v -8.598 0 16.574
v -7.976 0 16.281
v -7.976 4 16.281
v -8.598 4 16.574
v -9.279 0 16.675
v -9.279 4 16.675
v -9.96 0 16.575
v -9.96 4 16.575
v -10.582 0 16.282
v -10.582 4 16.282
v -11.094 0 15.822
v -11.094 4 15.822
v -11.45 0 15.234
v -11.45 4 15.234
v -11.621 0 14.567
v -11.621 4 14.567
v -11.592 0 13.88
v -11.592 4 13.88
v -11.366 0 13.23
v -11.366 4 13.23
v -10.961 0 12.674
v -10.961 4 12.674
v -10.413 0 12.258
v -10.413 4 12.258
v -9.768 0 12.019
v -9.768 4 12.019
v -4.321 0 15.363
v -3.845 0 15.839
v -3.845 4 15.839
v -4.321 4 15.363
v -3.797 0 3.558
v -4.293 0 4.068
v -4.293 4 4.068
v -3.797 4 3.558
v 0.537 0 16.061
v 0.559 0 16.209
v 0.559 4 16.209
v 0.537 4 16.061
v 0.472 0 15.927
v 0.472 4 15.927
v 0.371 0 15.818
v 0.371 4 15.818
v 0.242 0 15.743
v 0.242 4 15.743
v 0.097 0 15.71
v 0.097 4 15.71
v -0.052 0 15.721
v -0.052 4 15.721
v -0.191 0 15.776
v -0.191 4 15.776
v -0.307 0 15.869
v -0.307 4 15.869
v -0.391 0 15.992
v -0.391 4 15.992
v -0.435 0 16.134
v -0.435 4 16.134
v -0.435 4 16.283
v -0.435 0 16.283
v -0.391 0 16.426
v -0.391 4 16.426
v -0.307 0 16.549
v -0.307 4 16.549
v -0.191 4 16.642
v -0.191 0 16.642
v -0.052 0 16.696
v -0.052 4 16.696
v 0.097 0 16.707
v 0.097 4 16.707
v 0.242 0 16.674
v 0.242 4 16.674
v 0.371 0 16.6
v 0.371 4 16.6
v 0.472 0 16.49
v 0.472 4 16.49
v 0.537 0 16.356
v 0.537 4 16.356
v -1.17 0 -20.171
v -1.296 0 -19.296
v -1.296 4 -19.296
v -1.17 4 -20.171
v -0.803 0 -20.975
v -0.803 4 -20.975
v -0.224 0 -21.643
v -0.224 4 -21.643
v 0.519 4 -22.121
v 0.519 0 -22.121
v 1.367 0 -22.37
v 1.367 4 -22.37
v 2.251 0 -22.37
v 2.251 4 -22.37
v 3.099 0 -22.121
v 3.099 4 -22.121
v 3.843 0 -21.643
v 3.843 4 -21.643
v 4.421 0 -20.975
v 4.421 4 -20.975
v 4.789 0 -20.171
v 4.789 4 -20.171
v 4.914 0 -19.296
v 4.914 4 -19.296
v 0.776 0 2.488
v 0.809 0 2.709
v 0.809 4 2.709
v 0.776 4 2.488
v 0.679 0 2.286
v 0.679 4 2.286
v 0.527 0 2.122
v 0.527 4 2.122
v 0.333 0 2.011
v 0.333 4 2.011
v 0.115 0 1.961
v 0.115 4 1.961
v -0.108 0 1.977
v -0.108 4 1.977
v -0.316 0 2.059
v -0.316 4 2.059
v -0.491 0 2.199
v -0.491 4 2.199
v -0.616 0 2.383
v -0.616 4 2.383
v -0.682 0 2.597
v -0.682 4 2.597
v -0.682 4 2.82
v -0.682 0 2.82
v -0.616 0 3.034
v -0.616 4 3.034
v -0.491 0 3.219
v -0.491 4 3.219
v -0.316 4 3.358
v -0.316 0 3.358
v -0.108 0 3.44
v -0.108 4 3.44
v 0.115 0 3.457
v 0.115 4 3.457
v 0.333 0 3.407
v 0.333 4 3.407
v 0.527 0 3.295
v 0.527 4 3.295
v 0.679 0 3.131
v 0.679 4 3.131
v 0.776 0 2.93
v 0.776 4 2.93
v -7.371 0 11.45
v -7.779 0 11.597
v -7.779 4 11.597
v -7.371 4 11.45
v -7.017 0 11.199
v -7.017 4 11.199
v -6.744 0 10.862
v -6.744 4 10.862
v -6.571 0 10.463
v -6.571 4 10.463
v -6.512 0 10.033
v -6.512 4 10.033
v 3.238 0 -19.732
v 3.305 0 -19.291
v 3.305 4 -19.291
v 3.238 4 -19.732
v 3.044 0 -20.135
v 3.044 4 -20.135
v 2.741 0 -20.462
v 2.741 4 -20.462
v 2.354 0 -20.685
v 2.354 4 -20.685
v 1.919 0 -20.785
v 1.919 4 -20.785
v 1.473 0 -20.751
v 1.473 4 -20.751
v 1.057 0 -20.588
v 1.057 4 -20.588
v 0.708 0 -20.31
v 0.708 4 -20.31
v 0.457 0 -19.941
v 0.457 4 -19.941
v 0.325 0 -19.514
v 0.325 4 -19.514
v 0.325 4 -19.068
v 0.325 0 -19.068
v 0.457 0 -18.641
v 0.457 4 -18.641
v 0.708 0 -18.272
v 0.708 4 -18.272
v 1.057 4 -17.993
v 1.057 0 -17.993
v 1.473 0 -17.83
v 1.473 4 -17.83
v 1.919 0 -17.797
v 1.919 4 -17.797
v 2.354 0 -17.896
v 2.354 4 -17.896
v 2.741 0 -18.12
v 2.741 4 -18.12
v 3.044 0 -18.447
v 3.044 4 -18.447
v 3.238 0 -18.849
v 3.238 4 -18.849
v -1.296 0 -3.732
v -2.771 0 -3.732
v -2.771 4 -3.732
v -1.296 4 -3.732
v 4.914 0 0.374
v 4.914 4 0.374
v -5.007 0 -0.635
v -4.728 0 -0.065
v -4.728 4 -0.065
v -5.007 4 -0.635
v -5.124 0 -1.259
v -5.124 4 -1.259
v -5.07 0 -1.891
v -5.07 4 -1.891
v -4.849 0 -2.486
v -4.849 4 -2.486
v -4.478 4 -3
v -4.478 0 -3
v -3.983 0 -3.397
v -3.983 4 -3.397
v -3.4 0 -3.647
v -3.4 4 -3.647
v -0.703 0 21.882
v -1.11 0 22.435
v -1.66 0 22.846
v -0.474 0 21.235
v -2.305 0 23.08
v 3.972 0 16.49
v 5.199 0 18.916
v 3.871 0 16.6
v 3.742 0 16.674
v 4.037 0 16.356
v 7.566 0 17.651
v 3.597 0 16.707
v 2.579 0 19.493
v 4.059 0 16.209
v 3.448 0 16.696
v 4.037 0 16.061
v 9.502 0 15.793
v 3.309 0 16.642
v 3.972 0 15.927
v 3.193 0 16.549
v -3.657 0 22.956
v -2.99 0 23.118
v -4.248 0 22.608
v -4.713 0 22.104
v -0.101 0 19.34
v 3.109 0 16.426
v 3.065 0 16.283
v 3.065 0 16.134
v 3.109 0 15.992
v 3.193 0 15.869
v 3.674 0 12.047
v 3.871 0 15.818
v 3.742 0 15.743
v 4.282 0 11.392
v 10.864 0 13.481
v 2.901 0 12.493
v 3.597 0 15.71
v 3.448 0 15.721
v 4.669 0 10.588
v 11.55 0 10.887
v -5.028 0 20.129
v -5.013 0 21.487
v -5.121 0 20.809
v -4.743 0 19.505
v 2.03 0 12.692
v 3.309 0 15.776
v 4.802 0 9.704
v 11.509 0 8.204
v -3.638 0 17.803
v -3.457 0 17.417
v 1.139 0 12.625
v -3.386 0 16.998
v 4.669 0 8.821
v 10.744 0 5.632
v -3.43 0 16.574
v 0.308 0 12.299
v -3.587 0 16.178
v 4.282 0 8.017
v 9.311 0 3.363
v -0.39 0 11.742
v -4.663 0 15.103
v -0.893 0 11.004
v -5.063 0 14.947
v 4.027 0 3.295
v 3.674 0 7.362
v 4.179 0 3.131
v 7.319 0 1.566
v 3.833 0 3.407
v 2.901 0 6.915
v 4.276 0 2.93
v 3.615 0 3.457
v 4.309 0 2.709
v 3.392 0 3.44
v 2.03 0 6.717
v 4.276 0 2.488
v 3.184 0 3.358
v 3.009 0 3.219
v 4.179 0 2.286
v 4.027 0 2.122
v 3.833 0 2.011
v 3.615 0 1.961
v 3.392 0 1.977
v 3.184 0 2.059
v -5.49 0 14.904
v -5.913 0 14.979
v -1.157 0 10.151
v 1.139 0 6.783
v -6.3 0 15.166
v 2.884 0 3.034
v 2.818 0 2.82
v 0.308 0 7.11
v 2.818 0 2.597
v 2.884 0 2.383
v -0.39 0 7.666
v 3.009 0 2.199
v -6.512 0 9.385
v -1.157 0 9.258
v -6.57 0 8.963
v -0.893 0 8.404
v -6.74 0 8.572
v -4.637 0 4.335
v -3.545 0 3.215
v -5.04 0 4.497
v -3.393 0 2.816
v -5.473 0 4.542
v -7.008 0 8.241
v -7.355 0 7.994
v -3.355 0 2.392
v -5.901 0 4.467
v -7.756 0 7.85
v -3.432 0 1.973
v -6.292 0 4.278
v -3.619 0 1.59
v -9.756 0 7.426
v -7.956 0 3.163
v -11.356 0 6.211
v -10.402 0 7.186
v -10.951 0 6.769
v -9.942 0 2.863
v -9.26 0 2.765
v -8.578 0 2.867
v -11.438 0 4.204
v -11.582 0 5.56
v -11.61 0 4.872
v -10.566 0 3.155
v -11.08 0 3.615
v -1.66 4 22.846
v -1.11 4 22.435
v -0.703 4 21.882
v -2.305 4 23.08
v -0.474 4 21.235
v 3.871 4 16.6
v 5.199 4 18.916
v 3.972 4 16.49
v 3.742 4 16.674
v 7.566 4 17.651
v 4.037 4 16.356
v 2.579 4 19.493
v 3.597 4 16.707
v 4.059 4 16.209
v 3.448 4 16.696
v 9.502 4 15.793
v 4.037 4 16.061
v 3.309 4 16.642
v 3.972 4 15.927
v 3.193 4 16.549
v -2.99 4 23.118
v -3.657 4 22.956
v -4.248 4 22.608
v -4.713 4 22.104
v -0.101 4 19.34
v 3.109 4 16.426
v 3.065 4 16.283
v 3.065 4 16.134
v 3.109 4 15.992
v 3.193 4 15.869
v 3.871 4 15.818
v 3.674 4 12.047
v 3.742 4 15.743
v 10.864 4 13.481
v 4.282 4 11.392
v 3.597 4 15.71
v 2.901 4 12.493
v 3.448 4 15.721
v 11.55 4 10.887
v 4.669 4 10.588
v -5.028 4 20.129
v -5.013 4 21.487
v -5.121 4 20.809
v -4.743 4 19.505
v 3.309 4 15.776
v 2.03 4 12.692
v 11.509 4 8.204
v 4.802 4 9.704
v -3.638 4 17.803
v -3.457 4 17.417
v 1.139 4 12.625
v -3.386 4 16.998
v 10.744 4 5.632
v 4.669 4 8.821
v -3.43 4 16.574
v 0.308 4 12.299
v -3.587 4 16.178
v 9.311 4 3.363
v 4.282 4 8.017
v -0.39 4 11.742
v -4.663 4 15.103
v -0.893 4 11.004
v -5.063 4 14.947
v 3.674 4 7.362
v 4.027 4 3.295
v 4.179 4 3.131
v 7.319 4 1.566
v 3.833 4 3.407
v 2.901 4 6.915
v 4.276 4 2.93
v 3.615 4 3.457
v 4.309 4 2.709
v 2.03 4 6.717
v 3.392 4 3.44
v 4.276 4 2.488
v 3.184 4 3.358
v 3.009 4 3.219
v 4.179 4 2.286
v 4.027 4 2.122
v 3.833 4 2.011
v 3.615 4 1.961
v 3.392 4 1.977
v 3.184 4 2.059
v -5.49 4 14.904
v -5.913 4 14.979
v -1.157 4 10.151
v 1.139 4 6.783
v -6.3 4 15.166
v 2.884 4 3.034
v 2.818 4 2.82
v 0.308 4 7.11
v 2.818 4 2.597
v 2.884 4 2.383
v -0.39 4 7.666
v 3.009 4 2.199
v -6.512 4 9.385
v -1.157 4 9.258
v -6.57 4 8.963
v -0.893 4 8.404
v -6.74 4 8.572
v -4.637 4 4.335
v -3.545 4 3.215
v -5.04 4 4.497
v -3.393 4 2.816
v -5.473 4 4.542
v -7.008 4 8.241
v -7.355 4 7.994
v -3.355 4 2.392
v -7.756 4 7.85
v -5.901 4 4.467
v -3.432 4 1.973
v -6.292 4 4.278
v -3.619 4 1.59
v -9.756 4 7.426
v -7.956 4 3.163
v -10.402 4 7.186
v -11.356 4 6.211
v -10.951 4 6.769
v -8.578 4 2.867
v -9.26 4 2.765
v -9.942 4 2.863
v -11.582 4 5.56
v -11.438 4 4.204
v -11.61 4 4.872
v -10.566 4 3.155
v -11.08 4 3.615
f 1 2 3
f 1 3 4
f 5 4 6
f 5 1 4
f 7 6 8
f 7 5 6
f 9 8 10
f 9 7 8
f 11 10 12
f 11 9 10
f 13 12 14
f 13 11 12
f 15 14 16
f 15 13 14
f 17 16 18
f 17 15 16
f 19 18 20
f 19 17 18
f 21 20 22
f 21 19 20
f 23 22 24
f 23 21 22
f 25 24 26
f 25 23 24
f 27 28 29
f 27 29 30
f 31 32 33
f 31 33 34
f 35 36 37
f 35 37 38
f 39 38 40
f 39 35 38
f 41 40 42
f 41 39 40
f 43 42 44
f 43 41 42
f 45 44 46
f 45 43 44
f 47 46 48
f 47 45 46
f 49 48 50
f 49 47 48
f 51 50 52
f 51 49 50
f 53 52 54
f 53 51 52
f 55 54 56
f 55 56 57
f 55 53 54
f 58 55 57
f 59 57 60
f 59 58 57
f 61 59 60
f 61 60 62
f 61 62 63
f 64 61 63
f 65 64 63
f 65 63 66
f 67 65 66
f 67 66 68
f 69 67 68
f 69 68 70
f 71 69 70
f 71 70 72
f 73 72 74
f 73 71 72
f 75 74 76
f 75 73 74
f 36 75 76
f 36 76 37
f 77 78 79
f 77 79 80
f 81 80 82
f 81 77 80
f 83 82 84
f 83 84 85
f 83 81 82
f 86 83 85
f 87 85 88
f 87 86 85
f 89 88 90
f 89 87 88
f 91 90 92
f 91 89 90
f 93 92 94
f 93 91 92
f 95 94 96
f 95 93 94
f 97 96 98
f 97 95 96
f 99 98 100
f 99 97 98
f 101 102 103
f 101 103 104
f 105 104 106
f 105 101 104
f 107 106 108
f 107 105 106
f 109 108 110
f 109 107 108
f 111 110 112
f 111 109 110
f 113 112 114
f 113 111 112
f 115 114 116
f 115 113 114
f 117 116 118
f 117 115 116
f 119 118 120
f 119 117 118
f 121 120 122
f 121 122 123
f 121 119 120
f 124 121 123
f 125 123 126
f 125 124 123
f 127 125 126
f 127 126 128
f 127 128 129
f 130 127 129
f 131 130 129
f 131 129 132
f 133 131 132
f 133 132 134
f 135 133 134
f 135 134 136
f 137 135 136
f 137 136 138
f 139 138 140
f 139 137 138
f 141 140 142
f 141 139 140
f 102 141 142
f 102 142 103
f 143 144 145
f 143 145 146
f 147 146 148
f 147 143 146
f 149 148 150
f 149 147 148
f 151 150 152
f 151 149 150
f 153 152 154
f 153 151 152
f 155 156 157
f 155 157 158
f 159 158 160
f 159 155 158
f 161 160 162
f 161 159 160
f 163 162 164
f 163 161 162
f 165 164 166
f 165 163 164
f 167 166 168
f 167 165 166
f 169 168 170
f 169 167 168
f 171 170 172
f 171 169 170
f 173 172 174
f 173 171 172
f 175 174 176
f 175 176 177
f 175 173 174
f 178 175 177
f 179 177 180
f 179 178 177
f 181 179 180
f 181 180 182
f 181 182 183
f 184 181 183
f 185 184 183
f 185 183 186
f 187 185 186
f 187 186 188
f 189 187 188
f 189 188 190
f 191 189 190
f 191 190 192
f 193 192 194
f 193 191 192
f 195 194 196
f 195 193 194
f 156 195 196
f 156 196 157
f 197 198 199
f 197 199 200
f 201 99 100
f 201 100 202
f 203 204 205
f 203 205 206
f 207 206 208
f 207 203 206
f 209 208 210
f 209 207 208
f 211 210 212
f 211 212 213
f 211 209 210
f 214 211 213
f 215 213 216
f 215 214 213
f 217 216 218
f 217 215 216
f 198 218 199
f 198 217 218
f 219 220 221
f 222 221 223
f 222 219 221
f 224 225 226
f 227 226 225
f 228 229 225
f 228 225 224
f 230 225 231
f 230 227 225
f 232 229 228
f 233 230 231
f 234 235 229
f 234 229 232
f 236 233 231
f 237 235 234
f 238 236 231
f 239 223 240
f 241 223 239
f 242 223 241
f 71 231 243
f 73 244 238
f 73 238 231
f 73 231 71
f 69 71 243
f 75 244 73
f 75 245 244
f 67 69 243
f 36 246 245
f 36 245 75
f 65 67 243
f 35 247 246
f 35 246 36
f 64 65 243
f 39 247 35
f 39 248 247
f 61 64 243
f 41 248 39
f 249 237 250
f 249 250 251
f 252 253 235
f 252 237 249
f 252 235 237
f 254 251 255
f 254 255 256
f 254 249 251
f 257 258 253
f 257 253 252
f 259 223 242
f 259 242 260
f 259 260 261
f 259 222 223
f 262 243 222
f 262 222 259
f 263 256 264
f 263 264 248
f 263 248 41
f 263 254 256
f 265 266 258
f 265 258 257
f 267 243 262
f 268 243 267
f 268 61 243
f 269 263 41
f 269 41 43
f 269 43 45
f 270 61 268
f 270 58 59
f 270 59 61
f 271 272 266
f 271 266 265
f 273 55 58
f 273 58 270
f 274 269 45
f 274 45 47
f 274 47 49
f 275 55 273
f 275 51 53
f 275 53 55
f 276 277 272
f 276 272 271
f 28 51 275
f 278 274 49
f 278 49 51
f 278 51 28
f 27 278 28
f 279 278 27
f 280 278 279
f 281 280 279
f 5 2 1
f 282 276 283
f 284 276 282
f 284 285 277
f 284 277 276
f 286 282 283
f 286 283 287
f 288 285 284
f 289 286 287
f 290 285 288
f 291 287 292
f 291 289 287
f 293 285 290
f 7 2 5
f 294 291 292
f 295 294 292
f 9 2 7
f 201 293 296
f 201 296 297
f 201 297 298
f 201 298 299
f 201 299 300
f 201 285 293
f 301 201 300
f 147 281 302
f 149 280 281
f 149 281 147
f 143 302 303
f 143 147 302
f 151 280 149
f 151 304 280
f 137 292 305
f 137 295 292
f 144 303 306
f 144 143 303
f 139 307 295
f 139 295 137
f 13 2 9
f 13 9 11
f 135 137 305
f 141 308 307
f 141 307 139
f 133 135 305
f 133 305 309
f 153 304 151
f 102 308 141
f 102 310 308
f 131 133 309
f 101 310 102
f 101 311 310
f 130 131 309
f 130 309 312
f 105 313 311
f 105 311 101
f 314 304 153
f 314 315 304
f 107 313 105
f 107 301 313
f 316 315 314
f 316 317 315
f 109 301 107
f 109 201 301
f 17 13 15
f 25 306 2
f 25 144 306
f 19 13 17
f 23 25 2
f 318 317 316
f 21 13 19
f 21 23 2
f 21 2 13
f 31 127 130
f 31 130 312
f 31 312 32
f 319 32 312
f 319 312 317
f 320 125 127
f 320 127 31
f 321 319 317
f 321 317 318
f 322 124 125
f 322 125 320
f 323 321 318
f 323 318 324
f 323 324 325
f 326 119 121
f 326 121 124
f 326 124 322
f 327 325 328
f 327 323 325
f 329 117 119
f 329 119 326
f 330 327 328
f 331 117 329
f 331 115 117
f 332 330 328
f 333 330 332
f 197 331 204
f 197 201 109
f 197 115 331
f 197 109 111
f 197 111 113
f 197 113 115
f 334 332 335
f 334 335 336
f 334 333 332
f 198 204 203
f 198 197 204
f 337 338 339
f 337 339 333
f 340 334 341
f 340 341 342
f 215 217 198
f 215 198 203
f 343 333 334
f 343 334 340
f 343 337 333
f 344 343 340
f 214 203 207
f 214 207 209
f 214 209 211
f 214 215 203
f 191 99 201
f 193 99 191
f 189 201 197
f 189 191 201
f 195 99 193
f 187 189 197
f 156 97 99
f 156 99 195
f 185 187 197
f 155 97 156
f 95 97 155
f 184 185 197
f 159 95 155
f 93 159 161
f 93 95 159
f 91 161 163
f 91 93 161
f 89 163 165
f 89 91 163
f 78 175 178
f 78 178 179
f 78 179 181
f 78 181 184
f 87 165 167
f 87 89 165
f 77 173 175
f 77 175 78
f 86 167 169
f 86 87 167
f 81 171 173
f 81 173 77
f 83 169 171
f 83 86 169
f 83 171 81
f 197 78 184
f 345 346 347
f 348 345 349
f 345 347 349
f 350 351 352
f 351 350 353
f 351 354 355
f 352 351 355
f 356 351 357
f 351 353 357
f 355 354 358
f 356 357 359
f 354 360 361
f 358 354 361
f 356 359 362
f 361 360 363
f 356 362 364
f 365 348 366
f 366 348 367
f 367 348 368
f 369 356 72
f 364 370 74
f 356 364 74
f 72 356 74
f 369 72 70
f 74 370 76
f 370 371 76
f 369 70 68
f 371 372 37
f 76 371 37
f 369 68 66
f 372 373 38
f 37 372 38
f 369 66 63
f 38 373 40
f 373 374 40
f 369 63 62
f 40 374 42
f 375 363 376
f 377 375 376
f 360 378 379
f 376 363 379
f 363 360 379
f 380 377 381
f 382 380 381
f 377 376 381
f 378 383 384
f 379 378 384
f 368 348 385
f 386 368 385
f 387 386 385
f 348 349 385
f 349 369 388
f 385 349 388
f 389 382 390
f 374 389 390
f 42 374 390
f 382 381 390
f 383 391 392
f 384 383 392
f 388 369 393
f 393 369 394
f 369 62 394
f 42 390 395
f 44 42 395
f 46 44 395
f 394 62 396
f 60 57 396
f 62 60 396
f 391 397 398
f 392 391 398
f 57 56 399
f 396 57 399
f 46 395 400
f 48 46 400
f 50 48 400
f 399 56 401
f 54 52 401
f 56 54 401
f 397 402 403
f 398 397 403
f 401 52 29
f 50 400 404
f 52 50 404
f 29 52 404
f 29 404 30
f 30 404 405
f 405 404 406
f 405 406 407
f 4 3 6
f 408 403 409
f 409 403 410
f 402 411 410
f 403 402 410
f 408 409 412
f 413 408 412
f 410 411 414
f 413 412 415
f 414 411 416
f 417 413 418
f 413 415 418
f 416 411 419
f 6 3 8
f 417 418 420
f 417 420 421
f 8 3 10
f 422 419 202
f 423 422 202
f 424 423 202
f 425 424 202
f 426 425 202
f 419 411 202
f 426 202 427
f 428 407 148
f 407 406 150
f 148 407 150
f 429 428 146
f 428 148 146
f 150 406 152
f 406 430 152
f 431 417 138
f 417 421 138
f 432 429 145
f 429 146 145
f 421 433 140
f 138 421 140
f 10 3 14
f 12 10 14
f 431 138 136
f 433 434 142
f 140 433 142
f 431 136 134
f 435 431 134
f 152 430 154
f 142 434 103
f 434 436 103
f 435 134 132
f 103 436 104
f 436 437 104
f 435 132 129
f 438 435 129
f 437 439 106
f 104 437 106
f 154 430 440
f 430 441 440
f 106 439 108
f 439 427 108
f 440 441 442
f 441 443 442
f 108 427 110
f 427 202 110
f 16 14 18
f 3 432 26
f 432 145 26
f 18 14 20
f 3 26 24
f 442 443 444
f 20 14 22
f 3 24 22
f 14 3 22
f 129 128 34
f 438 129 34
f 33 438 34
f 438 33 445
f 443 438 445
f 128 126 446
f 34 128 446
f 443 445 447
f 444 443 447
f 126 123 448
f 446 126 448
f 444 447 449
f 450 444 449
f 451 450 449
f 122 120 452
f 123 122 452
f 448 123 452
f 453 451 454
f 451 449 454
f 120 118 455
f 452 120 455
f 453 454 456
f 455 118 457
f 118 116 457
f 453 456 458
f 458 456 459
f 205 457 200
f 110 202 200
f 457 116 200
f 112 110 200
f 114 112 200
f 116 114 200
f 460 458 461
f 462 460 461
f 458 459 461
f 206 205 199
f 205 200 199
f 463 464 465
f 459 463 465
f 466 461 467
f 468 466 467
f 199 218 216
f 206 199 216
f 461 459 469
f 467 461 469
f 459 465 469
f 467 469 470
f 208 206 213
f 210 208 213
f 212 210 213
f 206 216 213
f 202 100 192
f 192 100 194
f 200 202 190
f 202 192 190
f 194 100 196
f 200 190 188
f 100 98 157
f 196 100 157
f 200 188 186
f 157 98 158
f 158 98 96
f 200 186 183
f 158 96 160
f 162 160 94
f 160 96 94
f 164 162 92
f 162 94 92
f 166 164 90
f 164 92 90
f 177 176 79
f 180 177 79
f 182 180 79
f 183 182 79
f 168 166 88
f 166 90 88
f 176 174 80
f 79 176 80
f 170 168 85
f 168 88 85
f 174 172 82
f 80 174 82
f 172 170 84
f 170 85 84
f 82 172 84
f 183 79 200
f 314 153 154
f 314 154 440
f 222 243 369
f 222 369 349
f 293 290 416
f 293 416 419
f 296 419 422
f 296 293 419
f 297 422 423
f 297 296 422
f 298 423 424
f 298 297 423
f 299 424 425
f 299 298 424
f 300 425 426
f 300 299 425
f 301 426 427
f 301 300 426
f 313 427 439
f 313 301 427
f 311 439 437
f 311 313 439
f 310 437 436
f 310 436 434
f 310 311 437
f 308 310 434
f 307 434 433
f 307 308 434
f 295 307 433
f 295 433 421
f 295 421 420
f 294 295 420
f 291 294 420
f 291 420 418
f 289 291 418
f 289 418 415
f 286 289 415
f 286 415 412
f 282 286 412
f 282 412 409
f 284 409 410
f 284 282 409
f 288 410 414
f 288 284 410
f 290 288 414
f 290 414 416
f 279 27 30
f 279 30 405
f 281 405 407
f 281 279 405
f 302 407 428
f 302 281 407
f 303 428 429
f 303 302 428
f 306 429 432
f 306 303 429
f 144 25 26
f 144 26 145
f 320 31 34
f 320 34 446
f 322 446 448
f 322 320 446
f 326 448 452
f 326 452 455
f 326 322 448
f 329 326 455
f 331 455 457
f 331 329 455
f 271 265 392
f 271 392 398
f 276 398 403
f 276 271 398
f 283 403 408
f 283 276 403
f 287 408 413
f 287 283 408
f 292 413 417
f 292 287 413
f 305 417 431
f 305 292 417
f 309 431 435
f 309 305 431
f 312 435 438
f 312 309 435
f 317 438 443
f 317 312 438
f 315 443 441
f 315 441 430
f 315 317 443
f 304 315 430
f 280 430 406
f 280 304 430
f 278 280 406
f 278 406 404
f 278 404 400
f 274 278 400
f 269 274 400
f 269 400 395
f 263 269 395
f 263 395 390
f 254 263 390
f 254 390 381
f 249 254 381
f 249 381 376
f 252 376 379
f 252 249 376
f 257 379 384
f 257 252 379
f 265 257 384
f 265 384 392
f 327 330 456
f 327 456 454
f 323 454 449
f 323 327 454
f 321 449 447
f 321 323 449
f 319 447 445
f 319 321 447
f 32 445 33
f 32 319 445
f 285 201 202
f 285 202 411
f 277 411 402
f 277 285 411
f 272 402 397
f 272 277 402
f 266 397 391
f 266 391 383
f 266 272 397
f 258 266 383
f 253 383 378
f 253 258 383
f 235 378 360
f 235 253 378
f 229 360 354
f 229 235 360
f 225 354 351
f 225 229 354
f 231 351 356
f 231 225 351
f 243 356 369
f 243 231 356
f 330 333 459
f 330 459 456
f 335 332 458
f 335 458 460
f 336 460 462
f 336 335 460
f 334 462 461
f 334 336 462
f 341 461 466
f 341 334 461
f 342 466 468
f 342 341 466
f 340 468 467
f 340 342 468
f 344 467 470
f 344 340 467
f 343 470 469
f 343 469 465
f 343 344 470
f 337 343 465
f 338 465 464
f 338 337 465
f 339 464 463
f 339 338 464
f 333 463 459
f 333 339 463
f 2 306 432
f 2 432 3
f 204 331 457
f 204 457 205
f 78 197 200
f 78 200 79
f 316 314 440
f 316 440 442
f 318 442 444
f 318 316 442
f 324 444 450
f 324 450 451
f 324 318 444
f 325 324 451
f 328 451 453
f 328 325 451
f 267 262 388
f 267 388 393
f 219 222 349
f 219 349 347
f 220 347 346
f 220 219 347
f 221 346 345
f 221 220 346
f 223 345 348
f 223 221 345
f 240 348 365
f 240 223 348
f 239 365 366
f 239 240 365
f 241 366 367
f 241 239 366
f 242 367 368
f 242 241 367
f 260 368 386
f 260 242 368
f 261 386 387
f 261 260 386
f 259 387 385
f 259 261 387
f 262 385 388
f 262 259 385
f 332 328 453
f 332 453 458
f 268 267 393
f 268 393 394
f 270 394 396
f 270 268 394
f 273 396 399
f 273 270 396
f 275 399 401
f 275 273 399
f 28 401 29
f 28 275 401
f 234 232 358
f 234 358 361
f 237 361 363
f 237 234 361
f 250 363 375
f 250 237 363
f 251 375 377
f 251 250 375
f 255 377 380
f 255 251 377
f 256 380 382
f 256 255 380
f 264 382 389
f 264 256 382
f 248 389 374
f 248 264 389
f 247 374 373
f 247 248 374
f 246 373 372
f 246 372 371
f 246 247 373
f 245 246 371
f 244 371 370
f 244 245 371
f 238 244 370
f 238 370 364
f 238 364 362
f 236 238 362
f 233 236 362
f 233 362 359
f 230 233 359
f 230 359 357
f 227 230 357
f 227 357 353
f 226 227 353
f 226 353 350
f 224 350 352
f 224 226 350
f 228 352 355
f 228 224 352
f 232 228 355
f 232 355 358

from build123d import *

# Parameters (mm, degrees)
CROQUIS1_R              = 1.49817269
CROQUIS1_R_2            = 2.996164088
CROQUIS1_R_3            = 0.749999538
CROQUIS1_R_4            = 0.749999677
CROQUIS1_R_5            = 0.500000135
CROQUIS1_R_6            = 0.499999787
SALIENTE_EXTRUIR1_DEPTH = 4


with BuildPart() as part:
    # Croquis1 → Saliente-Extruir1 (new body)
    with BuildSketch(Plane(origin=(0, 0, 0), x_dir=(1, 0, 0), z_dir=(0, 1, 0))):
        with BuildLine():
            Line((-2.771145689, 3.732352208), (-1.295728101, 3.732352208))
            Line((-1.295728101, 3.732352208), (-1.295728101, 19.296313944))
            ThreePointArc((-1.295728101, 19.296313944), (1.809273381, 22.401315426), (4.914274862, 19.296313944))
            Line((4.914274862, 19.296313944), (4.914274862, -0.374323426))
            ThreePointArc((4.914274862, -0.374323426), (11.296230277, -12.207784547), (-0.100533102, -19.340381653))
            Line((-0.100533102, -19.340381653), (-0.473678479, -21.235402092))
            ThreePointArc((-0.473678479, -21.235402092), (-3.656560928, -22.956227452), (-4.742951437, -19.504889123))
            Line((-4.742951437, -19.504889123), (-3.638068078, -17.802867047))
            ThreePointArc((-3.638068078, -17.802867047), (-3.393654936, -16.784225076), (-3.844679826, -15.838738006))
            Line((-3.844679826, -15.838738006), (-4.320831306, -15.362586526))
            ThreePointArc((-4.320831306, -15.362586526), (-5.27515607, -14.910658594), (-6.299806788, -15.165738025))
            Line((-6.299806788, -15.165738025), (-7.976088157, -16.28110044))
            ThreePointArc((-7.976088157, -16.28110044), (-11.450003687, -15.233750996), (-9.768409722, -12.018588215))
            Line((-9.768409722, -12.018588215), (-7.77884303, -11.596670181))
            ThreePointArc((-7.77884303, -11.596670181), (-6.868732518, -11.039395013), (-6.512384859, -10.033475979))
            Line((-6.512384859, -10.033475979), (-6.512384859, -9.385437189))
            ThreePointArc((-6.512384859, -9.385437189), (-6.862343771, -8.397552686), (-7.756137447, -7.850268577))
            Line((-7.756137447, -7.850268577), (-9.756013297, -7.426164328))
            ThreePointArc((-9.756013297, -7.426164328), (-11.437933851, -4.204098724), (-7.955506206, -3.163300372))
            Line((-7.955506206, -3.163300372), (-6.292102369, -4.277795727))
            ThreePointArc((-6.292102369, -4.277795727), (-5.254751387, -4.534795839), (-4.293390141, -4.067965387))
            Line((-4.293390141, -4.067965387), (-3.797367558, -3.557739732))
            ThreePointArc((-3.797367558, -3.557739732), (-3.359699549, -2.605638888), (-3.61887602, -1.590317826))
            Line((-3.61887602, -1.590317826), (-4.728201004, 0.065299063))
            ThreePointArc((-4.728201004, 0.065299063), (-4.849446935, 2.48575952), (-2.771145689, 3.732352208))
        make_face()
        with Locations((1.806542391, 19.29086522)):
            Circle(CROQUIS1_R, mode=Mode.SUBTRACT)
        with Locations((1.80610831, -9.704394827)):
            Circle(CROQUIS1_R_2, mode=Mode.SUBTRACT)
        with Locations((0.059270172, -2.708668348)):
            Circle(CROQUIS1_R_3, mode=Mode.SUBTRACT)
        with Locations((3.559270137, -2.708669201)):
            Circle(CROQUIS1_R_4, mode=Mode.SUBTRACT)
        with Locations((0.059269976, -16.208667718)):
            Circle(CROQUIS1_R_5, mode=Mode.SUBTRACT)
        with Locations((3.559270485, -16.208667851)):
            Circle(CROQUIS1_R_6, mode=Mode.SUBTRACT)
    extrude(amount=SALIENTE_EXTRUIR1_DEPTH)


solid = part.part
